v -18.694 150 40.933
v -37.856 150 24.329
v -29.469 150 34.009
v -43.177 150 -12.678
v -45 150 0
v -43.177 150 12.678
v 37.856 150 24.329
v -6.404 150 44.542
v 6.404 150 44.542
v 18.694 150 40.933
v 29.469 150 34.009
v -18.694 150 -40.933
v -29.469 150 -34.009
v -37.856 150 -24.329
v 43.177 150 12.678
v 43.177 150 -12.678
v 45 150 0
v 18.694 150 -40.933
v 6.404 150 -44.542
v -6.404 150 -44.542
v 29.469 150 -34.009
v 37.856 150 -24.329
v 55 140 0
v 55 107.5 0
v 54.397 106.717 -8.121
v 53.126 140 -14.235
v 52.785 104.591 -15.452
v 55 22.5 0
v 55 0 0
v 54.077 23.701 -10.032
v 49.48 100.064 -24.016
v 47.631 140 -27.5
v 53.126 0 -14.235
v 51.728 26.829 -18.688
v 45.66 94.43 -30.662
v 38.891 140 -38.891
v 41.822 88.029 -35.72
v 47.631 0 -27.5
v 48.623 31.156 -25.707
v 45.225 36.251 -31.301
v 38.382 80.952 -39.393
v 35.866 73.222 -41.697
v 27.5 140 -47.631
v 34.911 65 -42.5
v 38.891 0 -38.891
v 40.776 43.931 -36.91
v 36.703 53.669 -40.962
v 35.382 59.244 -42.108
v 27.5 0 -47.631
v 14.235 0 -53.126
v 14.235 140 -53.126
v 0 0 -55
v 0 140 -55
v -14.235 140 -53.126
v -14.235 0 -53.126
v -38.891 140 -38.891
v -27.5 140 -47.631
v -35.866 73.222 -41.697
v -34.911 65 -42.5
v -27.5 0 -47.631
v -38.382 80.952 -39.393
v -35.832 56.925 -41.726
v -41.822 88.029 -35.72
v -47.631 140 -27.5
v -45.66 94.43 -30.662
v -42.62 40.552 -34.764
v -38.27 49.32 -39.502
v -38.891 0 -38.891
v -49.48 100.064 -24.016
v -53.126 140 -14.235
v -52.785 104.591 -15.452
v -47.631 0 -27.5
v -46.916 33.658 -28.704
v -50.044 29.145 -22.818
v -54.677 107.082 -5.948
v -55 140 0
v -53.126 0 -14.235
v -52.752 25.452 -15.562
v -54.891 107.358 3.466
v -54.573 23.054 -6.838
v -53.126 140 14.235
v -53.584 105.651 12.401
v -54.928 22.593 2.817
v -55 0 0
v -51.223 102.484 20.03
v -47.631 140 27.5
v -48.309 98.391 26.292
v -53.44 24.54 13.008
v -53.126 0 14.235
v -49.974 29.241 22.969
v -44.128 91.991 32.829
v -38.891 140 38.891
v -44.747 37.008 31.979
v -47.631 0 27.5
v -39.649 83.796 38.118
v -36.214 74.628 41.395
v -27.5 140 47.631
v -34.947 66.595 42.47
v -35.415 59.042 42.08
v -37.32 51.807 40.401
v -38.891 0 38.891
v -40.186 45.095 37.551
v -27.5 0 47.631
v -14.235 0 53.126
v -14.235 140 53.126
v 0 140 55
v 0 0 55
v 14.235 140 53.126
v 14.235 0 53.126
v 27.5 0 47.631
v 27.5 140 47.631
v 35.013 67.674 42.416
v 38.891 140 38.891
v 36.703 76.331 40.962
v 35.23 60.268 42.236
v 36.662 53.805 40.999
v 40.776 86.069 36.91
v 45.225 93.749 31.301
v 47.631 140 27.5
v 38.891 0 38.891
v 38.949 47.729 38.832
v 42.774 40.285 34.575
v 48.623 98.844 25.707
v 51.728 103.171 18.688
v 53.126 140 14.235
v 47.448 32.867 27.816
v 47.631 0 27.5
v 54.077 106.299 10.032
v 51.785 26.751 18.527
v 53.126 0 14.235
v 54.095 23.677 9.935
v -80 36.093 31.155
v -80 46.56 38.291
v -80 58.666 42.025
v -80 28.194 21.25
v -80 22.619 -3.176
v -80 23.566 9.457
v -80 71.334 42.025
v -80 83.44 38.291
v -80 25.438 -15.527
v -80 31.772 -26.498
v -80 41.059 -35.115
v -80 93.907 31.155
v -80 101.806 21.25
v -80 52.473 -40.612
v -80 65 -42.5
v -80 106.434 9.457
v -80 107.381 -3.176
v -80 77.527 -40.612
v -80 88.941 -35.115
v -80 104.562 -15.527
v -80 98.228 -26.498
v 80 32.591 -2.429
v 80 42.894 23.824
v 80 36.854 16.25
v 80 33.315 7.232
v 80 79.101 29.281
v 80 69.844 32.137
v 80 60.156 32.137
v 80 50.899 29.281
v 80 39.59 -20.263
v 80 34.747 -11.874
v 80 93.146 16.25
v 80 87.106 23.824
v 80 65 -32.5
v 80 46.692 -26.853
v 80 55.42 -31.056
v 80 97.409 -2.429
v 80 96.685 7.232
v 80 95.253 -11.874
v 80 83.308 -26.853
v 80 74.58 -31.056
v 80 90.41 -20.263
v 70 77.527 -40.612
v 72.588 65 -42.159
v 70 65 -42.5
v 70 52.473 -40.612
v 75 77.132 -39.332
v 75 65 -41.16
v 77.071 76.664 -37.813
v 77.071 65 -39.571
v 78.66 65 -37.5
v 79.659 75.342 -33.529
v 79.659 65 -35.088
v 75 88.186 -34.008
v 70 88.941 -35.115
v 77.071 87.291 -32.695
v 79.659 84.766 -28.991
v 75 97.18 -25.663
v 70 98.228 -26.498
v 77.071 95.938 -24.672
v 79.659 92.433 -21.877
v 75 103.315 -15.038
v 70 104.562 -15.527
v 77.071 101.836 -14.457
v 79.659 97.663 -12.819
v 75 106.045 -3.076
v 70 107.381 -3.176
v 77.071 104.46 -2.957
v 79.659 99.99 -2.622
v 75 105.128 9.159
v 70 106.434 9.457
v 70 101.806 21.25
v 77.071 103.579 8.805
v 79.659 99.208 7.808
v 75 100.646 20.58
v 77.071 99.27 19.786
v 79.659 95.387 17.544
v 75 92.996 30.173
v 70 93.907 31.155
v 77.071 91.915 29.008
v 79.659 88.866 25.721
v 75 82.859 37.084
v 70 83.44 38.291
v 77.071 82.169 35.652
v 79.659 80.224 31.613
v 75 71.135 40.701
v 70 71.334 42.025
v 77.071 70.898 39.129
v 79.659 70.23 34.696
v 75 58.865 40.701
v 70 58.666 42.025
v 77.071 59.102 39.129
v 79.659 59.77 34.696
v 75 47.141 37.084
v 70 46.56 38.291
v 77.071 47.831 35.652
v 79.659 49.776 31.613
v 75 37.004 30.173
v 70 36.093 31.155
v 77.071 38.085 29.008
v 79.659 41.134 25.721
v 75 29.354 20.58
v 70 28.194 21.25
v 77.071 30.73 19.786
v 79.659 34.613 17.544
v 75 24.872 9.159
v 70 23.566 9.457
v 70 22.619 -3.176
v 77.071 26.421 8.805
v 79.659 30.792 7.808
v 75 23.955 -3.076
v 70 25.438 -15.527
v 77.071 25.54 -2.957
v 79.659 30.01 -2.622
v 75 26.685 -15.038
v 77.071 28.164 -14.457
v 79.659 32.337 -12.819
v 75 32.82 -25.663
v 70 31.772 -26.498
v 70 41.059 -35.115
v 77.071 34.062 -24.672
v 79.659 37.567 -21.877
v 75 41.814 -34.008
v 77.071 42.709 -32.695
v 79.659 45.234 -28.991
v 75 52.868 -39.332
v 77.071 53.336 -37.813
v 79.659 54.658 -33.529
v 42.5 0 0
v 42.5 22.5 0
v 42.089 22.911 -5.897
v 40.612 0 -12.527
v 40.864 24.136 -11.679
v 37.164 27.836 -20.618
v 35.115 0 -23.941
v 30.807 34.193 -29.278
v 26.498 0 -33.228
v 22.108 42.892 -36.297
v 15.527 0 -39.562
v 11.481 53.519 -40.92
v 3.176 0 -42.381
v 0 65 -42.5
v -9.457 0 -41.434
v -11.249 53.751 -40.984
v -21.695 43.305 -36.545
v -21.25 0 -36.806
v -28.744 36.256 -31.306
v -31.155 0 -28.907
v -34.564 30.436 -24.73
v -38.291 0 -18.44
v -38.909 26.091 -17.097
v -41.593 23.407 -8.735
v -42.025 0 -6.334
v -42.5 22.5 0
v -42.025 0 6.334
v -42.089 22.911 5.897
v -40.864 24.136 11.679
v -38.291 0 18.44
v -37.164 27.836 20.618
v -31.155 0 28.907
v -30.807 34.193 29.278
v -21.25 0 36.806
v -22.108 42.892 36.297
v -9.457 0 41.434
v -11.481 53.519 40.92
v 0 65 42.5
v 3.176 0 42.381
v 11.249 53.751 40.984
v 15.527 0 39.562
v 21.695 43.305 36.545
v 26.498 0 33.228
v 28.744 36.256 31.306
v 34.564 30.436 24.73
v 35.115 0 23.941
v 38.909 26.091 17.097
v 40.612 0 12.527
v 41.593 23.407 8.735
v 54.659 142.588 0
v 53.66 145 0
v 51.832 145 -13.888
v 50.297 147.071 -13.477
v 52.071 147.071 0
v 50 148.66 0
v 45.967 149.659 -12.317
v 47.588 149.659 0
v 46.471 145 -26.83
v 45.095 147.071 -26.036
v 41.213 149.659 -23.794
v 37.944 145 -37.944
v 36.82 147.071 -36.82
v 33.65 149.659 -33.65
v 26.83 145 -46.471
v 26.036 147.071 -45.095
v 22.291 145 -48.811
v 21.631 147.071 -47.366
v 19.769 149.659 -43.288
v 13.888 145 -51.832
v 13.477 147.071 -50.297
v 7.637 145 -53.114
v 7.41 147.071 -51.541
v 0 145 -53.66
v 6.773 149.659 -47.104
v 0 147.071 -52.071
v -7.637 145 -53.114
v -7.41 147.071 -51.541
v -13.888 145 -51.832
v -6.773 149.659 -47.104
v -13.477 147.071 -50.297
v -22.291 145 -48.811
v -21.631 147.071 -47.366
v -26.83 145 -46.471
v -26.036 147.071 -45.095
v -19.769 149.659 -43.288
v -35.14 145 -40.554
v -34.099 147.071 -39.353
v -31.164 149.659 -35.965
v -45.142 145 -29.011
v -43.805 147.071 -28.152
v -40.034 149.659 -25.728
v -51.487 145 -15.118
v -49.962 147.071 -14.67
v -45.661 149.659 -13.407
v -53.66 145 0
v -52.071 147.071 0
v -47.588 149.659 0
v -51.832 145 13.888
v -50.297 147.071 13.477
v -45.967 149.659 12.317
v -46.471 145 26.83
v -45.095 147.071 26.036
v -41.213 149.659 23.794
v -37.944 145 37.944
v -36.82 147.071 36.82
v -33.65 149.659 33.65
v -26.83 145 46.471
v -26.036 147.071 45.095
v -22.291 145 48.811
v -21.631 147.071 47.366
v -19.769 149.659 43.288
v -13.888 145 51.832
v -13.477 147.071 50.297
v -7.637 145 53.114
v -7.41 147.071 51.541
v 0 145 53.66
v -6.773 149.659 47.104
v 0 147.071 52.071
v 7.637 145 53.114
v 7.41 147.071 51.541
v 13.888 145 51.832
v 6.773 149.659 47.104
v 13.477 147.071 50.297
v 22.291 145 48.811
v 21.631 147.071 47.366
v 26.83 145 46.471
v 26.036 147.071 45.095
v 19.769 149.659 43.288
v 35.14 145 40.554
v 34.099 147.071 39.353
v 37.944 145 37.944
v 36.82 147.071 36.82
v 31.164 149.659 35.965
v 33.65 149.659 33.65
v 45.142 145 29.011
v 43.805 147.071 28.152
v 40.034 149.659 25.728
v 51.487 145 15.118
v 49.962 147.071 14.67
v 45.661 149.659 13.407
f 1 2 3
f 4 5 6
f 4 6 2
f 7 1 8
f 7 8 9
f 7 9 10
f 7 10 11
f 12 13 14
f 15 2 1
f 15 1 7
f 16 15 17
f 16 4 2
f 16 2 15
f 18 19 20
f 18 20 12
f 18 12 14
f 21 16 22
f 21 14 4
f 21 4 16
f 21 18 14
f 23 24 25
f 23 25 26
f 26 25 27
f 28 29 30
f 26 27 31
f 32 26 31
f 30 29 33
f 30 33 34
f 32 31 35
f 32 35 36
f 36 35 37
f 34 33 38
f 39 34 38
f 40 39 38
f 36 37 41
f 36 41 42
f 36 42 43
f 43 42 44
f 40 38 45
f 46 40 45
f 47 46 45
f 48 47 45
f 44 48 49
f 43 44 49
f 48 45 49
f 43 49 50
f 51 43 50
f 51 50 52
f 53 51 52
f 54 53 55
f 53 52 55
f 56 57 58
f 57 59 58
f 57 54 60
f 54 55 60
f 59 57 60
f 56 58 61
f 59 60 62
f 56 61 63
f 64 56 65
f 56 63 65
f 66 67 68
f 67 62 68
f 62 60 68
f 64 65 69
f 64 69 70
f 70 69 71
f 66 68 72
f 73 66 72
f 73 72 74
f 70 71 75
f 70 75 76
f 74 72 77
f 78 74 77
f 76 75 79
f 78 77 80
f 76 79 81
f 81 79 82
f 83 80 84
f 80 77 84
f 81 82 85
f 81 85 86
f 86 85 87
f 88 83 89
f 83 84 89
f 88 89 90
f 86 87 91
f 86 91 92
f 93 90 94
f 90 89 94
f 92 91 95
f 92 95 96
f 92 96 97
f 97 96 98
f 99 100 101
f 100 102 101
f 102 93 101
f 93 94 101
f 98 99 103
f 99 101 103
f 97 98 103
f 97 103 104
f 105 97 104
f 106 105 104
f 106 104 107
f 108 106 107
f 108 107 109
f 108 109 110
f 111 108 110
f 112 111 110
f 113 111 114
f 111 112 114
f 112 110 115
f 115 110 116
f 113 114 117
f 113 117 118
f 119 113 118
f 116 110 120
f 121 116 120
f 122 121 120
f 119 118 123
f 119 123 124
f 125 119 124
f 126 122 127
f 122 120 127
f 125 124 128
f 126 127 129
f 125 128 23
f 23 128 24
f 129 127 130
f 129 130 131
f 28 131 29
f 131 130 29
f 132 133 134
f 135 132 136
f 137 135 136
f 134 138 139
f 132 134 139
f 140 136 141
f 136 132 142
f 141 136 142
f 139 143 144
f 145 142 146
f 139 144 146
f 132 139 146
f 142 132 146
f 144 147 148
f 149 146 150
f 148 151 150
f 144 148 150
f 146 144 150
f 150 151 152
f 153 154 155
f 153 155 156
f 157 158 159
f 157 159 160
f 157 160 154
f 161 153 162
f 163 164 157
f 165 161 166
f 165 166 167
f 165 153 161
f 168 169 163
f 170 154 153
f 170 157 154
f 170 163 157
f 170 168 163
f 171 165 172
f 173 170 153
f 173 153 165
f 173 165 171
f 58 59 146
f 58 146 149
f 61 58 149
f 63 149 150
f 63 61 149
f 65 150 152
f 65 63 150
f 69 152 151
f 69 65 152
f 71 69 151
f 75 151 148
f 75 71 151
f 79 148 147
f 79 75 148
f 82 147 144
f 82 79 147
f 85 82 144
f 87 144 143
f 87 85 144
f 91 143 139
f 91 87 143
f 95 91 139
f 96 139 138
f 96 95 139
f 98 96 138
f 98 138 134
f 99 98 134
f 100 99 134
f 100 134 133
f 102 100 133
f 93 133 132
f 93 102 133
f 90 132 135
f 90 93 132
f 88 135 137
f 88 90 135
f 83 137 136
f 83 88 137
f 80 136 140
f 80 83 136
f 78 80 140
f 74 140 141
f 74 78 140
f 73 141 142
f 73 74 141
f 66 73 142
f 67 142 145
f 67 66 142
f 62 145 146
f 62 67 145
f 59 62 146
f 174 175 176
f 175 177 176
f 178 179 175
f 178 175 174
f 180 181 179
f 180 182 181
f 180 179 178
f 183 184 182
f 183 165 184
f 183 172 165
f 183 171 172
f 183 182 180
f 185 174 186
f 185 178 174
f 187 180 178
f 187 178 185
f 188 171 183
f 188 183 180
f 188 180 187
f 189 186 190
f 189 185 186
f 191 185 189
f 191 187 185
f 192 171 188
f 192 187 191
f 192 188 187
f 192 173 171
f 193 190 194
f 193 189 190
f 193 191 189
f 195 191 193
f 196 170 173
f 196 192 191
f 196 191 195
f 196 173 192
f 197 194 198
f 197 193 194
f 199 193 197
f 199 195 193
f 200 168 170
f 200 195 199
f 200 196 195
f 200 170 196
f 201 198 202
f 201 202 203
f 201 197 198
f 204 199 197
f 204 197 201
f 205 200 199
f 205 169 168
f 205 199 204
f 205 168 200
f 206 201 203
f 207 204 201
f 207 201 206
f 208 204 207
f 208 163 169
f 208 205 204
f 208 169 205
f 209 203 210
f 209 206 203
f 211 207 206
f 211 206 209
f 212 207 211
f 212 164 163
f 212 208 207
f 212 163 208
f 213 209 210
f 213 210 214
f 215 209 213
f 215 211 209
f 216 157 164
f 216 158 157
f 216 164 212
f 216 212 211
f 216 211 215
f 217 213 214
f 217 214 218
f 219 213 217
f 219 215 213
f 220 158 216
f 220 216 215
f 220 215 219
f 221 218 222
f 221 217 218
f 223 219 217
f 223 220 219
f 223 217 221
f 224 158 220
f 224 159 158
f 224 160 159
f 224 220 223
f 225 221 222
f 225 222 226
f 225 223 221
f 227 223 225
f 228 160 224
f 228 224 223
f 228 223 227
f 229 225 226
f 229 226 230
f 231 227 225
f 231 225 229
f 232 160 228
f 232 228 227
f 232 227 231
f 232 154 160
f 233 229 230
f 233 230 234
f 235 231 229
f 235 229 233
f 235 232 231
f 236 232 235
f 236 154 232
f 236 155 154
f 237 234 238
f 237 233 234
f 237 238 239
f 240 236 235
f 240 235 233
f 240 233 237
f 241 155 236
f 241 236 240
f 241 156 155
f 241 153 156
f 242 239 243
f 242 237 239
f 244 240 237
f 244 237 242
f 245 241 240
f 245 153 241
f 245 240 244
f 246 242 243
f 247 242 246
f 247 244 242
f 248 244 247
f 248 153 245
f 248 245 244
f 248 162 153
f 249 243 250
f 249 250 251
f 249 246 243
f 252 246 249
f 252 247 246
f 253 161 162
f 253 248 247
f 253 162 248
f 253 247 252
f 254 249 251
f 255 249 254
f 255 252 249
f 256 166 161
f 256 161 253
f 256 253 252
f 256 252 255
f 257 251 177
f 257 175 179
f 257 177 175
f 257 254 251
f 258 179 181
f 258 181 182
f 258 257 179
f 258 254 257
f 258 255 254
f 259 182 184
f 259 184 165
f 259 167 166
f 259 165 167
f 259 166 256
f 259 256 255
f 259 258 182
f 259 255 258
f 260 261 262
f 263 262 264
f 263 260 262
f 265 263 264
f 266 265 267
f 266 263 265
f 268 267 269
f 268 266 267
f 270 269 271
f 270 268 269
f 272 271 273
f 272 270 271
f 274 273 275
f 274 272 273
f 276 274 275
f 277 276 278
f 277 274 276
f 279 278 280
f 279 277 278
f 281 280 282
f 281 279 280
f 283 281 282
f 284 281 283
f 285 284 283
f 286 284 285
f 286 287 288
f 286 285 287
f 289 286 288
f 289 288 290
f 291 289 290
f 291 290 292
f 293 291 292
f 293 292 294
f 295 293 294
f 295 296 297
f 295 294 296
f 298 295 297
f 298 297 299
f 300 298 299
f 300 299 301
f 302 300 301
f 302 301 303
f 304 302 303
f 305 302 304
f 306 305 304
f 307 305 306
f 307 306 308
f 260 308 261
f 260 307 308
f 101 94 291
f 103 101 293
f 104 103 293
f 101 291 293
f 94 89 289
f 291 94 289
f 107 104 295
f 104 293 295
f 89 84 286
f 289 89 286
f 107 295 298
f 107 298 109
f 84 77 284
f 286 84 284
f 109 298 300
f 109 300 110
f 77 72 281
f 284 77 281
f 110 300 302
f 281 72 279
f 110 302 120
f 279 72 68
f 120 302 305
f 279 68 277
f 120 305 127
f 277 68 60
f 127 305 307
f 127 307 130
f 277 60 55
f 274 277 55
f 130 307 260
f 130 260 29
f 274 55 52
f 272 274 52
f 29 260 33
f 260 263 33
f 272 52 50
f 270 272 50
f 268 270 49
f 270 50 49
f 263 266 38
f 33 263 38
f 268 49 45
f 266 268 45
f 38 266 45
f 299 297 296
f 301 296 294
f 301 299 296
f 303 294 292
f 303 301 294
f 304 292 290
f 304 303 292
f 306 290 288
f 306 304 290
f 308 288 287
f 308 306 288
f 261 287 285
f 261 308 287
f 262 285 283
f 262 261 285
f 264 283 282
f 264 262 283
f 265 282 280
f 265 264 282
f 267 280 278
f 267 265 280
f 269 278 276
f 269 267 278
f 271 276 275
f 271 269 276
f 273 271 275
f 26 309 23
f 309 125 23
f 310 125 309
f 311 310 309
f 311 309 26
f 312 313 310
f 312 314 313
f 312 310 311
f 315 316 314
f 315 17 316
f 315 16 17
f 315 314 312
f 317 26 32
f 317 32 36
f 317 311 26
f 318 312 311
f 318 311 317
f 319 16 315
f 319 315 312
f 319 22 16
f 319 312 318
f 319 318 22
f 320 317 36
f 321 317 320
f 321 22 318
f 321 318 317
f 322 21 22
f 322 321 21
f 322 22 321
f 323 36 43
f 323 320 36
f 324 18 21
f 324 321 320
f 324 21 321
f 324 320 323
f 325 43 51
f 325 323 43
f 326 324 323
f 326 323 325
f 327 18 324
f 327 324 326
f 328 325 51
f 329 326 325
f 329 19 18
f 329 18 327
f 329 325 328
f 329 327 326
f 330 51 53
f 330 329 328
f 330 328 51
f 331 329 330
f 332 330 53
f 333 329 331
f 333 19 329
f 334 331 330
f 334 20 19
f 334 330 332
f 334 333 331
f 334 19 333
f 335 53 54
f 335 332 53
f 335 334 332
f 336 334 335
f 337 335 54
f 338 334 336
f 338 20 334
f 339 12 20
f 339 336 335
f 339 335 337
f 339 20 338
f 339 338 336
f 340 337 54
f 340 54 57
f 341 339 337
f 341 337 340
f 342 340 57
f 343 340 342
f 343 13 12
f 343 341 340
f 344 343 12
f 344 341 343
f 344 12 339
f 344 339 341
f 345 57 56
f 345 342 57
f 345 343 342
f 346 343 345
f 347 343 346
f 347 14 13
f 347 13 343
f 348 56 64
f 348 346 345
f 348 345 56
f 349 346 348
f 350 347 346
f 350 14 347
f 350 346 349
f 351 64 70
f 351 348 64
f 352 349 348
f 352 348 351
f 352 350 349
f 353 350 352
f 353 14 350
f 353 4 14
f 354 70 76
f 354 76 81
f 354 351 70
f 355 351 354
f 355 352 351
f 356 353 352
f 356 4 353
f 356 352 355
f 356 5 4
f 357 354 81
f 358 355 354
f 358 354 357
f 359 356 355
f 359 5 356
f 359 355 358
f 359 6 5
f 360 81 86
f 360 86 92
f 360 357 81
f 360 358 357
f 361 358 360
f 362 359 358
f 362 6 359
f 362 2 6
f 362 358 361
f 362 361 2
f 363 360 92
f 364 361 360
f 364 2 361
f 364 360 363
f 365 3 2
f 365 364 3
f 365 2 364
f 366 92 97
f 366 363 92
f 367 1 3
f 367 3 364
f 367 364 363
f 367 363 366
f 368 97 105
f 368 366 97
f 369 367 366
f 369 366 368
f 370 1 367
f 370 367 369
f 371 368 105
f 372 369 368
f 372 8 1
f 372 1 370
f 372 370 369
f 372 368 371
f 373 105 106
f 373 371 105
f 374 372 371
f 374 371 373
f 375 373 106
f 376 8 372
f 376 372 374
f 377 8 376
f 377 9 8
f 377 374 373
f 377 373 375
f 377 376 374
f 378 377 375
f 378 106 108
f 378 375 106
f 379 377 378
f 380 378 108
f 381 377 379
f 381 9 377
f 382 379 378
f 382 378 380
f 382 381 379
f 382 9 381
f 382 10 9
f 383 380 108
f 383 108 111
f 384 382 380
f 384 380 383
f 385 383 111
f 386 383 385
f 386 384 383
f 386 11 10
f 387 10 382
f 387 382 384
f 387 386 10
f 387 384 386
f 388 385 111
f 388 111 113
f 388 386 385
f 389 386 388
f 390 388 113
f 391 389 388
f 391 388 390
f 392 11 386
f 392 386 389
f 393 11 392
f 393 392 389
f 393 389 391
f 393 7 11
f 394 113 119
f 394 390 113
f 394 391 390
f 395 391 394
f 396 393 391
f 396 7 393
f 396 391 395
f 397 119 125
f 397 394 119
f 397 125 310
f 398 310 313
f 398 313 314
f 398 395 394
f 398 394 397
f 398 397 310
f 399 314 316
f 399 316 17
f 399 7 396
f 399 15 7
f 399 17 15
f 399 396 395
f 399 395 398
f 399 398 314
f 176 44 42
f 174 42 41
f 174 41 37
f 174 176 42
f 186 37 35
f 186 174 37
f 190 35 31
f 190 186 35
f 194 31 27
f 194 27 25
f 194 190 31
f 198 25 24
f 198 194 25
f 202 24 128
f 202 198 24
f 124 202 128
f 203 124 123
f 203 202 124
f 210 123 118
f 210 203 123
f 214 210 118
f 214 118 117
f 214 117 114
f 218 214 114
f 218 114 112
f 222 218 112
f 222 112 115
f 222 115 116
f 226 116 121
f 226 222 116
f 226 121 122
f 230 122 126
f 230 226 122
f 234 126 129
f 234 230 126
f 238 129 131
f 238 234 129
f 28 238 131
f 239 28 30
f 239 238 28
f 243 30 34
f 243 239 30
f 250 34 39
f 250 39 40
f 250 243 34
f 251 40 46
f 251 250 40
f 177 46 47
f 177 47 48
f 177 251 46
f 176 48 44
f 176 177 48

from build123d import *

# Parameters (mm, degrees)
SKETCH1_R               = 55
BOSS_EXTRUDE1_DEPTH     = 150
SKETCH11_R              = 42.5
CUT_EXTRUDE9_DEPTH      = 65
CUT_EXTRUDE9_DEPTH_BACK = 1
FILLET5_R               = 10
SKETCH3_R               = 42.5
BOSS_EXTRUDE6_DEPTH     = 80
FILLET7_R               = 10


with BuildPart() as part:
    # Sketch1 → Boss-Extrude1 (new body)
    with BuildSketch(Plane(origin=(0, 0, 0), x_dir=(1, 0, 0), z_dir=(0, 1, 0))):
        Circle(SKETCH1_R)
    extrude(amount=BOSS_EXTRUDE1_DEPTH)

    # Sketch11 → Cut-Extrude9 (cut, two sides)
    with BuildSketch(Plane(origin=(0, 0, 0), x_dir=(1, 0, 0), z_dir=(0, 1, 0))) as cut_extrude9_sk:
        Circle(SKETCH11_R)
    extrude(amount=CUT_EXTRUDE9_DEPTH, mode=Mode.SUBTRACT)
    extrude(cut_extrude9_sk.sketch, amount=-CUT_EXTRUDE9_DEPTH_BACK, mode=Mode.SUBTRACT)

    # Fillet5
    fillet5_edges = [part.edges().sort_by_distance(p)[0] for p in [
        (-55, 150, 0),
    ]]
    fillet(fillet5_edges, radius=FILLET5_R)

    # Sketch3 → Boss-Extrude6 (add, symmetric)
    with BuildSketch(Plane(origin=(0, 0, 0), x_dir=(0, 0, -1), z_dir=(1, 0, 0))):
        with Locations((0, 65)):
            Circle(SKETCH3_R)
    extrude(amount=BOSS_EXTRUDE6_DEPTH, both=True)

    # Fillet7
    fillet7_edges = [part.edges().sort_by_distance(p)[0] for p in [
        (80, 65, 42.5),
    ]]
    fillet(fillet7_edges, radius=FILLET7_R)


solid = part.part
